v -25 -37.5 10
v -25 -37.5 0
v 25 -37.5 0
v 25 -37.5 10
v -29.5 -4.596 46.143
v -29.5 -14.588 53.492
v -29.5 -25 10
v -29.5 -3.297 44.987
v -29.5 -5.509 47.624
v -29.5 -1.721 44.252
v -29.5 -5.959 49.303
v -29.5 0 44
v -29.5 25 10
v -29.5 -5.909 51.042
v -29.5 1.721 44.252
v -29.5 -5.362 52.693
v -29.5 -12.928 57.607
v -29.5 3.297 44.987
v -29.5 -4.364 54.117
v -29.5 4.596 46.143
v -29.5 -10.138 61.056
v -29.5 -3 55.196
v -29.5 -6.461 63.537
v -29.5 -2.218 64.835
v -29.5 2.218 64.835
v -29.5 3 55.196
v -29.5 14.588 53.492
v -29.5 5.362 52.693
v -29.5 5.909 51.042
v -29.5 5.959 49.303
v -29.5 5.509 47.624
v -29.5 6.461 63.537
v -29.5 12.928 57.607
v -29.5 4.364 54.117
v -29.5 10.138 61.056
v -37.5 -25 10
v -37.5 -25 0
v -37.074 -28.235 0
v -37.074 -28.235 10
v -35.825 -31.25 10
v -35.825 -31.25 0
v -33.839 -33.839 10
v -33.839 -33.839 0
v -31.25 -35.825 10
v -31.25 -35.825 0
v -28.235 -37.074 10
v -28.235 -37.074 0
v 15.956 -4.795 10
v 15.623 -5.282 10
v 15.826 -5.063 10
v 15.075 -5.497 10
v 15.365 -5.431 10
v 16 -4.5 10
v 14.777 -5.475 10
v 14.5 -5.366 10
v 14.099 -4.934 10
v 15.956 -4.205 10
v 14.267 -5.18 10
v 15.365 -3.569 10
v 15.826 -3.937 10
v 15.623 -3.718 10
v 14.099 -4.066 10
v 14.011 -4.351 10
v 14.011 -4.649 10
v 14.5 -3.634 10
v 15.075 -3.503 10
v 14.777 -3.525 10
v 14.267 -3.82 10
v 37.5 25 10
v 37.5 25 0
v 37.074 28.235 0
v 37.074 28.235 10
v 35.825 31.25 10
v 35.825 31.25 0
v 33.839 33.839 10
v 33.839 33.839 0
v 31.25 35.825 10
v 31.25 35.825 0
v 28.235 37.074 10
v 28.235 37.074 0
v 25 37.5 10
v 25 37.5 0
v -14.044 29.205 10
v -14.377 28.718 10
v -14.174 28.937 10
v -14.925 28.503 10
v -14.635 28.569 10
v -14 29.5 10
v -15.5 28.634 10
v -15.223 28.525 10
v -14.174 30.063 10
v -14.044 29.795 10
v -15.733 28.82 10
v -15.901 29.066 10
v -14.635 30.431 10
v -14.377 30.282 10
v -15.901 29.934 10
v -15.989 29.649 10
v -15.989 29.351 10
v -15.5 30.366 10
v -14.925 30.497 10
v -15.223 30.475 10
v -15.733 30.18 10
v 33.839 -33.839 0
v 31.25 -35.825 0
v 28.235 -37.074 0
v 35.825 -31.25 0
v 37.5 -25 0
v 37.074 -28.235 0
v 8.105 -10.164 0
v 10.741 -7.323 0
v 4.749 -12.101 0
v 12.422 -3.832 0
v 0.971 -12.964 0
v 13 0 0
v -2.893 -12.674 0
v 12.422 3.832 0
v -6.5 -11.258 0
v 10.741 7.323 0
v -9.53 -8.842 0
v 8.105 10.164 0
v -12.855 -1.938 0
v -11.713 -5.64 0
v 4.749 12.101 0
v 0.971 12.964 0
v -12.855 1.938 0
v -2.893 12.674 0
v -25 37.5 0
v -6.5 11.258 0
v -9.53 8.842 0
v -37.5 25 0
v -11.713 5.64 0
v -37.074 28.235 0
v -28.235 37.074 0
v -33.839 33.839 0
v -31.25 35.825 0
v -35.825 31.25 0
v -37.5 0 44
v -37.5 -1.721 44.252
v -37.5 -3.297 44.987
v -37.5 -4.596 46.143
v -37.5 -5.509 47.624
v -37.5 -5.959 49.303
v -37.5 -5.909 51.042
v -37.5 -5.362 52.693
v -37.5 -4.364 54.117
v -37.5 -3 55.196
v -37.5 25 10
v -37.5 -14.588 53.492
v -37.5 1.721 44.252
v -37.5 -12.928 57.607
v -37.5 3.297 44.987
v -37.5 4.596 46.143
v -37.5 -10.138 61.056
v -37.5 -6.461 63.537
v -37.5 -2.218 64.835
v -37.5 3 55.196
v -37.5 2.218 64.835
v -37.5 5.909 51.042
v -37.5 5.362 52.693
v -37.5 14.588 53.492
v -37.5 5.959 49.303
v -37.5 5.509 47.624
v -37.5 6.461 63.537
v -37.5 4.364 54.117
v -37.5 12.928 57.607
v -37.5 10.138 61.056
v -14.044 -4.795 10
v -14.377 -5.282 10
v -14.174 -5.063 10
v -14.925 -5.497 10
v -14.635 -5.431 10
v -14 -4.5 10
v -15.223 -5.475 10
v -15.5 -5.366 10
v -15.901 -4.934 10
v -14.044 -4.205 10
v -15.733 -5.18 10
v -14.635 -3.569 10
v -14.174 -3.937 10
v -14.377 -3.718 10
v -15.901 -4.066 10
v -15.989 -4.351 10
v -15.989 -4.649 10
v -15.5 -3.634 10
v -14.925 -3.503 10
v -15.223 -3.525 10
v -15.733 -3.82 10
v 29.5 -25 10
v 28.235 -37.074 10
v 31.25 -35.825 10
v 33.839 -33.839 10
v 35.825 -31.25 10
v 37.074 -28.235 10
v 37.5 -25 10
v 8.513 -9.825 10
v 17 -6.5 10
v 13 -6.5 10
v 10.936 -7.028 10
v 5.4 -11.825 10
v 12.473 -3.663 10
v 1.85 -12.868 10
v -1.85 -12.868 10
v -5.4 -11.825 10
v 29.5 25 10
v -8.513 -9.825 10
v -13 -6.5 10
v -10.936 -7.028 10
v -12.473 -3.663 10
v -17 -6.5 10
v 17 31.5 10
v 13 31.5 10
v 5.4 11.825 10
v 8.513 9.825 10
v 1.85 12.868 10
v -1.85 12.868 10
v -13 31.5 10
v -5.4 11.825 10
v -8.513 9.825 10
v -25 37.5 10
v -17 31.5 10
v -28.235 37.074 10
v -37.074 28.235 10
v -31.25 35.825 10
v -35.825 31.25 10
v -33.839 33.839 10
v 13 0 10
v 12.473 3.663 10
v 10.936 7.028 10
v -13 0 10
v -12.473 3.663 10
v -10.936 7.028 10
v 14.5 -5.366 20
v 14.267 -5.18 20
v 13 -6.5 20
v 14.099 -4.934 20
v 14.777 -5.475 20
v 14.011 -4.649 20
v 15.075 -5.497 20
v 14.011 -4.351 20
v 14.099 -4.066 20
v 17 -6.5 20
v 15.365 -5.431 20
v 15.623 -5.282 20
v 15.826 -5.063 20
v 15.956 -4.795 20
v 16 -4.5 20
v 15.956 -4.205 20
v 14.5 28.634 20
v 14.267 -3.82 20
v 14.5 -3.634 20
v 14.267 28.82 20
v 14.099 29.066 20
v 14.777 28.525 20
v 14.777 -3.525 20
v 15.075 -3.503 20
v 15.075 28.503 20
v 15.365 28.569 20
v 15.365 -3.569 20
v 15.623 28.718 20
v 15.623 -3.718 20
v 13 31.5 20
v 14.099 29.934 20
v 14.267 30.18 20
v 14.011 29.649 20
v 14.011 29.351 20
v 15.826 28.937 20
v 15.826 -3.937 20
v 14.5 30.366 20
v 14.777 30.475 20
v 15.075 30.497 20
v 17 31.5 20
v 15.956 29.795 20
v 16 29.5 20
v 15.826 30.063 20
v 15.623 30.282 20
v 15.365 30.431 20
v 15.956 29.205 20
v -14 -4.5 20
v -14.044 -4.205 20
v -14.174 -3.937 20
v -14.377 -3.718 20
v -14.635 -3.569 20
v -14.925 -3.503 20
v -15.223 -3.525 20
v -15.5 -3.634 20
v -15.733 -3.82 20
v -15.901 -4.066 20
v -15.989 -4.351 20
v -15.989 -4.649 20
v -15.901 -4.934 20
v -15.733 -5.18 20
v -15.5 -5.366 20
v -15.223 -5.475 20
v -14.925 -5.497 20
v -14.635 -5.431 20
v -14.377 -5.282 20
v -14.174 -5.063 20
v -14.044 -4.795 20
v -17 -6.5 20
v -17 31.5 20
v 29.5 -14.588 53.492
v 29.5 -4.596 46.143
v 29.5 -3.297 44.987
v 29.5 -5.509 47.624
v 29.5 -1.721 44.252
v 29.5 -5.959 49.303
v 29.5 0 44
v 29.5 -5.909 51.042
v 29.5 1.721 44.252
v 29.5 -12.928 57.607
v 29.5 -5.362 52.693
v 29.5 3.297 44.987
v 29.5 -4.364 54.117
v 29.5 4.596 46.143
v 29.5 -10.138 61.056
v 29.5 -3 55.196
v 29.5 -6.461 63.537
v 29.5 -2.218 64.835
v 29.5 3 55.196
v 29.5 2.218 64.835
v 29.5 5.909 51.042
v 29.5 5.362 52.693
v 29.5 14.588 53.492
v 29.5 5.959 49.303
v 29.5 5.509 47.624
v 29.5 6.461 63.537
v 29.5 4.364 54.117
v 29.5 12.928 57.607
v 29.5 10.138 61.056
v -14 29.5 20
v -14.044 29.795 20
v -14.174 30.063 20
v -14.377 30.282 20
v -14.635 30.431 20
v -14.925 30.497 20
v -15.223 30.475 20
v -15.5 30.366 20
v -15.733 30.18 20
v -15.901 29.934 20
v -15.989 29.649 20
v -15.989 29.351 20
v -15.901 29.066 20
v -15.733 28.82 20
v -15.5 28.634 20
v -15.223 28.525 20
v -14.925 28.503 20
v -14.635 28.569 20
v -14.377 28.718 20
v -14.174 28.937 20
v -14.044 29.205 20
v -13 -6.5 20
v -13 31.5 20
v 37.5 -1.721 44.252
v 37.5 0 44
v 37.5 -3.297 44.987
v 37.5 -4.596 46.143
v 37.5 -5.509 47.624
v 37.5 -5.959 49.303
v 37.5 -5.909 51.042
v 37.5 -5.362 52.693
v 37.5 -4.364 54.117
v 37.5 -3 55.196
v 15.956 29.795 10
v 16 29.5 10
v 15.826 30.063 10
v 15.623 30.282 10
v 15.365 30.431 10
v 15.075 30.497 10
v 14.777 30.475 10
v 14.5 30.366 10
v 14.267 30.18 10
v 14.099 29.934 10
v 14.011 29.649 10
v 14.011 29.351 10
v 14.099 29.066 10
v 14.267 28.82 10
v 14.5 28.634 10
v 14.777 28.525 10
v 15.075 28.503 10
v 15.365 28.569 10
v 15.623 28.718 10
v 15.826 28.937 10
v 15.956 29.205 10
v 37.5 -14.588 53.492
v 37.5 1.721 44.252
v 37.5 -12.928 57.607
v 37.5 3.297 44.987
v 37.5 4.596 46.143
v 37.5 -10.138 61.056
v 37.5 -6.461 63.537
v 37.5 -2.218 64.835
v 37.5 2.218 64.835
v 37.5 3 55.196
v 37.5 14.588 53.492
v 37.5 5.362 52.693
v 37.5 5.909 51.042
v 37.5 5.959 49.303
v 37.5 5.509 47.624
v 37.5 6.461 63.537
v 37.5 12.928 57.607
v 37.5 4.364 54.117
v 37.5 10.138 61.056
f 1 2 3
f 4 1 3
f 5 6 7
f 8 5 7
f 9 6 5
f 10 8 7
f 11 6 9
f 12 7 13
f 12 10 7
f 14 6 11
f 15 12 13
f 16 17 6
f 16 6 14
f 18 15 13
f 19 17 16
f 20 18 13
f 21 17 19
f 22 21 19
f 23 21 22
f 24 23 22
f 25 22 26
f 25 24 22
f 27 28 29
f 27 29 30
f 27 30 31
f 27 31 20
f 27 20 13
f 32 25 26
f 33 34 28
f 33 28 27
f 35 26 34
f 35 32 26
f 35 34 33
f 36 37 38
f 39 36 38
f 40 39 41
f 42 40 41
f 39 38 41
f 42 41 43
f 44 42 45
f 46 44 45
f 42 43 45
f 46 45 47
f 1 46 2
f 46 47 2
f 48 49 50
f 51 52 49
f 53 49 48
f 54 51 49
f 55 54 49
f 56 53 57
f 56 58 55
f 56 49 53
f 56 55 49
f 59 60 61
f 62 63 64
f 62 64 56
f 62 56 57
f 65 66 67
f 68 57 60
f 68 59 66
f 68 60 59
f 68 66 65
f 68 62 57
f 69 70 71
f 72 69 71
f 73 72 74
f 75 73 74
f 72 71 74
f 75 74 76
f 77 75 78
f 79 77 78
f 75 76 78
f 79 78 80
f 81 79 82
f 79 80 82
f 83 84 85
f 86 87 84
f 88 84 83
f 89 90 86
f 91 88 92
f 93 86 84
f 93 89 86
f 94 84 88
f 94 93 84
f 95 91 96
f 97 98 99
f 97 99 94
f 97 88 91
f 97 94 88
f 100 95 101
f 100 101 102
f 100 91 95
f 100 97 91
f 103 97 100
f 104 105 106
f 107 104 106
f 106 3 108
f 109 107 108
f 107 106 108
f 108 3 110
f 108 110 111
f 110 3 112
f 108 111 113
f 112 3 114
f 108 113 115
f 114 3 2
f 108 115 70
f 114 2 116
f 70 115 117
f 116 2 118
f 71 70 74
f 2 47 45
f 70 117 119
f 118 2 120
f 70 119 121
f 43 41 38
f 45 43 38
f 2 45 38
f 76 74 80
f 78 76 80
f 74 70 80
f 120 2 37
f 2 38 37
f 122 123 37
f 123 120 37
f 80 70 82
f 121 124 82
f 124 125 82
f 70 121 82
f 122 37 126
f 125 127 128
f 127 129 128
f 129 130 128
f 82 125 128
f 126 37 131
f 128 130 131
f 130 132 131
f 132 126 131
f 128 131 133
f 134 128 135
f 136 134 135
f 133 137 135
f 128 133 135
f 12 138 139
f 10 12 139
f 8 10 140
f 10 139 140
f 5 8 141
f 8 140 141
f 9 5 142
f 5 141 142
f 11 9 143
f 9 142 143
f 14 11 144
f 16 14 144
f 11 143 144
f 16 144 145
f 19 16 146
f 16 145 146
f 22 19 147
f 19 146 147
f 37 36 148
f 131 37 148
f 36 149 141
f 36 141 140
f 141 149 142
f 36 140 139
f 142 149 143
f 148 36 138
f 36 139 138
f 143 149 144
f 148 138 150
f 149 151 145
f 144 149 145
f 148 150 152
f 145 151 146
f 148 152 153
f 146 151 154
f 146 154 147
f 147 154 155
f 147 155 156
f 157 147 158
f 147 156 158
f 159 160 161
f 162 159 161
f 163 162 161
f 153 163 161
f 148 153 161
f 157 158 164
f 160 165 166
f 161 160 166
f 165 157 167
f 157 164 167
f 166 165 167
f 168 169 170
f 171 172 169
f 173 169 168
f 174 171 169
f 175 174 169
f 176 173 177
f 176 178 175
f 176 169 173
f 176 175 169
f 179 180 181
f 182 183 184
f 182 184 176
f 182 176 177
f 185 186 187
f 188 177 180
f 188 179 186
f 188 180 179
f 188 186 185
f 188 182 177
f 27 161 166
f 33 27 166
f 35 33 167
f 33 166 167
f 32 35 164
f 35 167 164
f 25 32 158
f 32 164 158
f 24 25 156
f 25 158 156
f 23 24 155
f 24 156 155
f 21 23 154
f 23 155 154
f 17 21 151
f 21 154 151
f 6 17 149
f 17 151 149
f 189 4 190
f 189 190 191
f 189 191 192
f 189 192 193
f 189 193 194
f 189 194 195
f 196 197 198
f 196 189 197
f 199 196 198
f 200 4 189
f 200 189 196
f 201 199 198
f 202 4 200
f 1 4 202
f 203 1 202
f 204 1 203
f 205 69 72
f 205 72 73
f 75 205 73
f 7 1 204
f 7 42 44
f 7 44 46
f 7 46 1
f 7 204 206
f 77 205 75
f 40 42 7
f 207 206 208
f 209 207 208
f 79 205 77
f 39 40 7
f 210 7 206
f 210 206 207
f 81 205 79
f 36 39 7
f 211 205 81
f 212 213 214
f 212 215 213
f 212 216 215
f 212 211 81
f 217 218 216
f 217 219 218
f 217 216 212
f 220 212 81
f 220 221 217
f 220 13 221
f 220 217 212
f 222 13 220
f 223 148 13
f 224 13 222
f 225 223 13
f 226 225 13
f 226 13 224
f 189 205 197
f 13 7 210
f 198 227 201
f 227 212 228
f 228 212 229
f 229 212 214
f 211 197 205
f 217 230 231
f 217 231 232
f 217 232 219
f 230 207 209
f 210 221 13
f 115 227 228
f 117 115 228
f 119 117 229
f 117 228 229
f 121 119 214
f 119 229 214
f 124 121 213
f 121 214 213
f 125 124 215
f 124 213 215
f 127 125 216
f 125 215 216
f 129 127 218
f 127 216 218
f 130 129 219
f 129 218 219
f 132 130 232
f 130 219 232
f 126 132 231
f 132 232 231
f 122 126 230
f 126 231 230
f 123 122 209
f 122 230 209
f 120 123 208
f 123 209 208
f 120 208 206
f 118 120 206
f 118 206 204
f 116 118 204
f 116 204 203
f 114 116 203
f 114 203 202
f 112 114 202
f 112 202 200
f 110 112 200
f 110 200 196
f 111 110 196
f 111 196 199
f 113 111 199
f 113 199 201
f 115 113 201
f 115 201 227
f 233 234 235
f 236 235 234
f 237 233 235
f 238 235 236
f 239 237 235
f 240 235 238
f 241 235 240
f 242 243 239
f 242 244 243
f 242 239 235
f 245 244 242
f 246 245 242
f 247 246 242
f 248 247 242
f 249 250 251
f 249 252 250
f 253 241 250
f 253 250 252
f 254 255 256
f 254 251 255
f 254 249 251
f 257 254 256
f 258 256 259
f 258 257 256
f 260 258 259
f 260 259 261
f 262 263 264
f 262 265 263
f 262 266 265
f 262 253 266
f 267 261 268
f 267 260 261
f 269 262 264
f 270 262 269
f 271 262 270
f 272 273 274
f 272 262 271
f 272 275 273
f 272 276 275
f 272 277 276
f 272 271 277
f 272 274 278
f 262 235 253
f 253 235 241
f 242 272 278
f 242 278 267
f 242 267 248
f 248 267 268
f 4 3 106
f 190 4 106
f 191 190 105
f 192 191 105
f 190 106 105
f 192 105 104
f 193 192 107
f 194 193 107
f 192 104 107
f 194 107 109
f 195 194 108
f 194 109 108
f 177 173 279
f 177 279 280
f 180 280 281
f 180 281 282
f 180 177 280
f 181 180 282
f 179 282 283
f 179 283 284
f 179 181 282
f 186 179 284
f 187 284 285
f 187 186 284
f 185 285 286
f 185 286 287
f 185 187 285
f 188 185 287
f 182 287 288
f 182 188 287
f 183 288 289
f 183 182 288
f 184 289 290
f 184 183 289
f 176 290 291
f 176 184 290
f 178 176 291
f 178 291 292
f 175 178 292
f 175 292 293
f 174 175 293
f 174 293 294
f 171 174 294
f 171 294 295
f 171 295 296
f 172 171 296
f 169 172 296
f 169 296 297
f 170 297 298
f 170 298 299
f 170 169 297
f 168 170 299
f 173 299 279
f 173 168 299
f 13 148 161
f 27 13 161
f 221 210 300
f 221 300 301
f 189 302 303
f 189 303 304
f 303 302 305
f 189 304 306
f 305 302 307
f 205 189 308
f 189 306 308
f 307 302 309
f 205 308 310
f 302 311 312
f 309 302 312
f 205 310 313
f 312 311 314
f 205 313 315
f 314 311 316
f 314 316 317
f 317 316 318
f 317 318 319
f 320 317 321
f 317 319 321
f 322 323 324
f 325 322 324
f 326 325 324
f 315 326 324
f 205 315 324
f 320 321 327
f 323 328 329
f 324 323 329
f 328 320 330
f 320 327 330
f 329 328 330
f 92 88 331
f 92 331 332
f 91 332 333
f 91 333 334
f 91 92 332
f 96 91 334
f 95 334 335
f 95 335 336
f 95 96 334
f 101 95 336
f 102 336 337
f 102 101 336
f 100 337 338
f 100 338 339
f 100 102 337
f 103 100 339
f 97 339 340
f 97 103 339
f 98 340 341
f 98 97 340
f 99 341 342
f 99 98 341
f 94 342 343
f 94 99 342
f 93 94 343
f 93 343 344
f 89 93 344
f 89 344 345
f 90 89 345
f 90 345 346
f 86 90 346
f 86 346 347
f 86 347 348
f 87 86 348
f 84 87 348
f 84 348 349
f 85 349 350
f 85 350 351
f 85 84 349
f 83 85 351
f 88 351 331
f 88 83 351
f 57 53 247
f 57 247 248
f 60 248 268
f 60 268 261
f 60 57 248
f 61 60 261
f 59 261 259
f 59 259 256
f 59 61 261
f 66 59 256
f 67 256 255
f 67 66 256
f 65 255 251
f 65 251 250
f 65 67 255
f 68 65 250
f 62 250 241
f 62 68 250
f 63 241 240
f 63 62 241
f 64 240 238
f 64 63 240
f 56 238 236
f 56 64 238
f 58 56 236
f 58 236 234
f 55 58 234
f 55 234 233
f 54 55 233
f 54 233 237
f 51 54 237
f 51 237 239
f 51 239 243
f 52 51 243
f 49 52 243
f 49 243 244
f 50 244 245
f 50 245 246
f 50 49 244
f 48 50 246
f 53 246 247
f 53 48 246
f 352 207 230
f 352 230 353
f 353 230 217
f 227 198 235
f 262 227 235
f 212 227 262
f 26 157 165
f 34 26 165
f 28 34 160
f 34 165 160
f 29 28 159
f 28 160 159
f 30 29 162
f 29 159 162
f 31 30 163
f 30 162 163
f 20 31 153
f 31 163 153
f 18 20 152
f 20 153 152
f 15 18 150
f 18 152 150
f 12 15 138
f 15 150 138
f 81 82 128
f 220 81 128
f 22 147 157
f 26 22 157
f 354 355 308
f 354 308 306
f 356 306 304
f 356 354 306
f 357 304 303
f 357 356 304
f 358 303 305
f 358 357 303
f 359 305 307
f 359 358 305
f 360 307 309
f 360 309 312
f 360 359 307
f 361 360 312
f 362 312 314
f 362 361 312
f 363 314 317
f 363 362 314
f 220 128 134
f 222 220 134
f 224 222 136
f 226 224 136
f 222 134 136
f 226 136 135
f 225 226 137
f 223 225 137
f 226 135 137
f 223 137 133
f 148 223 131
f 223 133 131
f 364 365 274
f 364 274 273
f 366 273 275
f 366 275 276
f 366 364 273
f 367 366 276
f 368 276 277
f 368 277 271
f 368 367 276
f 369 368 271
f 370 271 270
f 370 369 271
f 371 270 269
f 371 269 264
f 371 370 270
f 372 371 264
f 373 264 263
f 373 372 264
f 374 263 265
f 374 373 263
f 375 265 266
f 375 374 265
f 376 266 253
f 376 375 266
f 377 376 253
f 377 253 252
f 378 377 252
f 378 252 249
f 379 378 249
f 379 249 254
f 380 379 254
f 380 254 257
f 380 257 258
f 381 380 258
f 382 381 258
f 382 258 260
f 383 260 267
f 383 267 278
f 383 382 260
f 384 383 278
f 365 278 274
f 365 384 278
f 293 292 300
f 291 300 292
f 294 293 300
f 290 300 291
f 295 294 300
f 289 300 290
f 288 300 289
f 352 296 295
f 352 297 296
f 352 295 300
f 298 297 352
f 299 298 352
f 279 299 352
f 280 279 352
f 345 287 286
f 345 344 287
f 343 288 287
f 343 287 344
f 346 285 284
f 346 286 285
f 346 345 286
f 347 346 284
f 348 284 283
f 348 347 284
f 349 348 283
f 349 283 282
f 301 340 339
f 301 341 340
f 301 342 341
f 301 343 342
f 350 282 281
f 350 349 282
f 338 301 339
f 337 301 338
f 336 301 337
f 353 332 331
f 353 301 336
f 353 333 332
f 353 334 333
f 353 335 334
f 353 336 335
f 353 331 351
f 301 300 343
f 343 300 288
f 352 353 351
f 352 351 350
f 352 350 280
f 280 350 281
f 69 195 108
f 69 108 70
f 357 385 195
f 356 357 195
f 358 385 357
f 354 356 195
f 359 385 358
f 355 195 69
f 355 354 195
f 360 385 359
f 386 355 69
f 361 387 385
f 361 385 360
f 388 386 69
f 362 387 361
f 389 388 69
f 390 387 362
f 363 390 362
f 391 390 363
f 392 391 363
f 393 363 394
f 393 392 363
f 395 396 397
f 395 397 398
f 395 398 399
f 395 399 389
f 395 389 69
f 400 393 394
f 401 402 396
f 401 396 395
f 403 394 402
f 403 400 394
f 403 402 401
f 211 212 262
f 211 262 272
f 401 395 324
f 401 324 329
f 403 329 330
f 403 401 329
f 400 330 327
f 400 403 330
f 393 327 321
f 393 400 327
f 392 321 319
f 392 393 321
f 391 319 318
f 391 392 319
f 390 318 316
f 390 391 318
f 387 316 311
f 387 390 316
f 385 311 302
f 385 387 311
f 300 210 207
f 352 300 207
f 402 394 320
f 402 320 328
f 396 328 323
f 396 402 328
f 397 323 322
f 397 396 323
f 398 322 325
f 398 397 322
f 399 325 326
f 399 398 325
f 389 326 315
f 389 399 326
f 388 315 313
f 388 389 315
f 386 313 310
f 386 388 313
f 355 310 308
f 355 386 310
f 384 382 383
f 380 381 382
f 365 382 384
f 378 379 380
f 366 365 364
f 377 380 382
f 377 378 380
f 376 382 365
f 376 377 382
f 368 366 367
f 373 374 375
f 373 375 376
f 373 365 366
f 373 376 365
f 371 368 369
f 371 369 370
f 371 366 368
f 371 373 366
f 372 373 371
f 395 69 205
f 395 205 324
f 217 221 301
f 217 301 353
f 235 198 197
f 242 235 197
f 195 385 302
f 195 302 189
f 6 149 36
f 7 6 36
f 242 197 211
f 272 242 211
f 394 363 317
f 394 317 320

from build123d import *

# Parameters (mm, degrees)
BOSS_EXTRUDE1_DEPTH = 10
BOSS_EXTRUDE2_DEPTH = 8
SKETCH4_R           = 13
CUT_EXTRUDE2_DEPTH  = 77.40353395
SKETCH5_W           = 4
SKETCH5_H           = 38
SKETCH5_R           = 1
BOSS_EXTRUDE3_DEPTH = 10


with BuildPart() as part:
    # Sketch1 → Boss-Extrude1 (new body)
    with BuildSketch(Plane(origin=(0, 0, 0), x_dir=(0, 1, 0), z_dir=(0, 0, 1))):
        with BuildLine():
            Line((-25, -37.5), (25, -37.5))
            ThreePointArc((25, -37.5), (33.838834765, -33.838834765), (37.5, -25))
            Line((37.5, -25), (37.5, 25))
            ThreePointArc((37.5, 25), (33.838834765, 33.838834765), (25, 37.5))
            Line((25, 37.5), (-25, 37.5))
            ThreePointArc((-25, 37.5), (-33.838834765, 33.838834765), (-37.5, 25))
            Line((-37.5, 25), (-37.5, -25))
            ThreePointArc((-37.5, -25), (-33.838834765, -33.838834765), (-25, -37.5))
        make_face()
    extrude(amount=BOSS_EXTRUDE1_DEPTH)

    # Sketch2 → Boss-Extrude2 (add)
    with BuildSketch(Plane.YZ.offset(37.5)):
        with BuildLine():
            ThreePointArc((14.587782351, 53.492363969), (0, 65), (-14.587782351, 53.492363969))
            Line((-14.587782351, 53.492363969), (-25, 10))
            Line((-25, 10), (25, 10))
            Line((25, 10), (14.587782351, 53.492363969))
        make_face()
        with BuildLine():
            ThreePointArc((0, 44), (-5.795554958, 48.447085729), (-3, 55.196152423))
            Line((-3, 55.196152423), (3, 55.196152423))
            ThreePointArc((3, 55.196152423), (5.795554958, 48.447085729), (0, 44))
        make_face(mode=Mode.SUBTRACT)
    boss_extrude2 = extrude(amount=-BOSS_EXTRUDE2_DEPTH)

    # Mirror1: Boss-Extrude2 across plane
    add(boss_extrude2.mirror(Plane(origin=(0, 0, 0), x_dir=(0, 0, 1), z_dir=(1, 0, 0))))

    # Sketch4 → Cut-Extrude2 (cut, through all)
    with BuildSketch(Plane.XY.offset(10)):
        Circle(SKETCH4_R)
    extrude(amount=-CUT_EXTRUDE2_DEPTH, mode=Mode.SUBTRACT)

    # Sketch5 → Boss-Extrude3 (add)
    # profile 1 of 2: a face of its own
    with BuildSketch(Plane.XY.offset(10)):
        with Locations((-15, 12.5)):
            Rectangle(SKETCH5_W, SKETCH5_H)
        with Locations((-15, -4.5)):
            Circle(SKETCH5_R, mode=Mode.SUBTRACT)
        with Locations((-15, 29.5)):
            Circle(SKETCH5_R, mode=Mode.SUBTRACT)
    # profile 2 of 2: a face of its own
    with BuildSketch(Plane.XY.offset(10)):
        with Locations((15, 12.5)):
            Rectangle(SKETCH5_W, SKETCH5_H)
        with Locations((15, -4.5)):
            Circle(SKETCH5_R, mode=Mode.SUBTRACT)
        with Locations((15, 29.5)):
            Circle(SKETCH5_R, mode=Mode.SUBTRACT)
    extrude(amount=BOSS_EXTRUDE3_DEPTH)


solid = part.part
